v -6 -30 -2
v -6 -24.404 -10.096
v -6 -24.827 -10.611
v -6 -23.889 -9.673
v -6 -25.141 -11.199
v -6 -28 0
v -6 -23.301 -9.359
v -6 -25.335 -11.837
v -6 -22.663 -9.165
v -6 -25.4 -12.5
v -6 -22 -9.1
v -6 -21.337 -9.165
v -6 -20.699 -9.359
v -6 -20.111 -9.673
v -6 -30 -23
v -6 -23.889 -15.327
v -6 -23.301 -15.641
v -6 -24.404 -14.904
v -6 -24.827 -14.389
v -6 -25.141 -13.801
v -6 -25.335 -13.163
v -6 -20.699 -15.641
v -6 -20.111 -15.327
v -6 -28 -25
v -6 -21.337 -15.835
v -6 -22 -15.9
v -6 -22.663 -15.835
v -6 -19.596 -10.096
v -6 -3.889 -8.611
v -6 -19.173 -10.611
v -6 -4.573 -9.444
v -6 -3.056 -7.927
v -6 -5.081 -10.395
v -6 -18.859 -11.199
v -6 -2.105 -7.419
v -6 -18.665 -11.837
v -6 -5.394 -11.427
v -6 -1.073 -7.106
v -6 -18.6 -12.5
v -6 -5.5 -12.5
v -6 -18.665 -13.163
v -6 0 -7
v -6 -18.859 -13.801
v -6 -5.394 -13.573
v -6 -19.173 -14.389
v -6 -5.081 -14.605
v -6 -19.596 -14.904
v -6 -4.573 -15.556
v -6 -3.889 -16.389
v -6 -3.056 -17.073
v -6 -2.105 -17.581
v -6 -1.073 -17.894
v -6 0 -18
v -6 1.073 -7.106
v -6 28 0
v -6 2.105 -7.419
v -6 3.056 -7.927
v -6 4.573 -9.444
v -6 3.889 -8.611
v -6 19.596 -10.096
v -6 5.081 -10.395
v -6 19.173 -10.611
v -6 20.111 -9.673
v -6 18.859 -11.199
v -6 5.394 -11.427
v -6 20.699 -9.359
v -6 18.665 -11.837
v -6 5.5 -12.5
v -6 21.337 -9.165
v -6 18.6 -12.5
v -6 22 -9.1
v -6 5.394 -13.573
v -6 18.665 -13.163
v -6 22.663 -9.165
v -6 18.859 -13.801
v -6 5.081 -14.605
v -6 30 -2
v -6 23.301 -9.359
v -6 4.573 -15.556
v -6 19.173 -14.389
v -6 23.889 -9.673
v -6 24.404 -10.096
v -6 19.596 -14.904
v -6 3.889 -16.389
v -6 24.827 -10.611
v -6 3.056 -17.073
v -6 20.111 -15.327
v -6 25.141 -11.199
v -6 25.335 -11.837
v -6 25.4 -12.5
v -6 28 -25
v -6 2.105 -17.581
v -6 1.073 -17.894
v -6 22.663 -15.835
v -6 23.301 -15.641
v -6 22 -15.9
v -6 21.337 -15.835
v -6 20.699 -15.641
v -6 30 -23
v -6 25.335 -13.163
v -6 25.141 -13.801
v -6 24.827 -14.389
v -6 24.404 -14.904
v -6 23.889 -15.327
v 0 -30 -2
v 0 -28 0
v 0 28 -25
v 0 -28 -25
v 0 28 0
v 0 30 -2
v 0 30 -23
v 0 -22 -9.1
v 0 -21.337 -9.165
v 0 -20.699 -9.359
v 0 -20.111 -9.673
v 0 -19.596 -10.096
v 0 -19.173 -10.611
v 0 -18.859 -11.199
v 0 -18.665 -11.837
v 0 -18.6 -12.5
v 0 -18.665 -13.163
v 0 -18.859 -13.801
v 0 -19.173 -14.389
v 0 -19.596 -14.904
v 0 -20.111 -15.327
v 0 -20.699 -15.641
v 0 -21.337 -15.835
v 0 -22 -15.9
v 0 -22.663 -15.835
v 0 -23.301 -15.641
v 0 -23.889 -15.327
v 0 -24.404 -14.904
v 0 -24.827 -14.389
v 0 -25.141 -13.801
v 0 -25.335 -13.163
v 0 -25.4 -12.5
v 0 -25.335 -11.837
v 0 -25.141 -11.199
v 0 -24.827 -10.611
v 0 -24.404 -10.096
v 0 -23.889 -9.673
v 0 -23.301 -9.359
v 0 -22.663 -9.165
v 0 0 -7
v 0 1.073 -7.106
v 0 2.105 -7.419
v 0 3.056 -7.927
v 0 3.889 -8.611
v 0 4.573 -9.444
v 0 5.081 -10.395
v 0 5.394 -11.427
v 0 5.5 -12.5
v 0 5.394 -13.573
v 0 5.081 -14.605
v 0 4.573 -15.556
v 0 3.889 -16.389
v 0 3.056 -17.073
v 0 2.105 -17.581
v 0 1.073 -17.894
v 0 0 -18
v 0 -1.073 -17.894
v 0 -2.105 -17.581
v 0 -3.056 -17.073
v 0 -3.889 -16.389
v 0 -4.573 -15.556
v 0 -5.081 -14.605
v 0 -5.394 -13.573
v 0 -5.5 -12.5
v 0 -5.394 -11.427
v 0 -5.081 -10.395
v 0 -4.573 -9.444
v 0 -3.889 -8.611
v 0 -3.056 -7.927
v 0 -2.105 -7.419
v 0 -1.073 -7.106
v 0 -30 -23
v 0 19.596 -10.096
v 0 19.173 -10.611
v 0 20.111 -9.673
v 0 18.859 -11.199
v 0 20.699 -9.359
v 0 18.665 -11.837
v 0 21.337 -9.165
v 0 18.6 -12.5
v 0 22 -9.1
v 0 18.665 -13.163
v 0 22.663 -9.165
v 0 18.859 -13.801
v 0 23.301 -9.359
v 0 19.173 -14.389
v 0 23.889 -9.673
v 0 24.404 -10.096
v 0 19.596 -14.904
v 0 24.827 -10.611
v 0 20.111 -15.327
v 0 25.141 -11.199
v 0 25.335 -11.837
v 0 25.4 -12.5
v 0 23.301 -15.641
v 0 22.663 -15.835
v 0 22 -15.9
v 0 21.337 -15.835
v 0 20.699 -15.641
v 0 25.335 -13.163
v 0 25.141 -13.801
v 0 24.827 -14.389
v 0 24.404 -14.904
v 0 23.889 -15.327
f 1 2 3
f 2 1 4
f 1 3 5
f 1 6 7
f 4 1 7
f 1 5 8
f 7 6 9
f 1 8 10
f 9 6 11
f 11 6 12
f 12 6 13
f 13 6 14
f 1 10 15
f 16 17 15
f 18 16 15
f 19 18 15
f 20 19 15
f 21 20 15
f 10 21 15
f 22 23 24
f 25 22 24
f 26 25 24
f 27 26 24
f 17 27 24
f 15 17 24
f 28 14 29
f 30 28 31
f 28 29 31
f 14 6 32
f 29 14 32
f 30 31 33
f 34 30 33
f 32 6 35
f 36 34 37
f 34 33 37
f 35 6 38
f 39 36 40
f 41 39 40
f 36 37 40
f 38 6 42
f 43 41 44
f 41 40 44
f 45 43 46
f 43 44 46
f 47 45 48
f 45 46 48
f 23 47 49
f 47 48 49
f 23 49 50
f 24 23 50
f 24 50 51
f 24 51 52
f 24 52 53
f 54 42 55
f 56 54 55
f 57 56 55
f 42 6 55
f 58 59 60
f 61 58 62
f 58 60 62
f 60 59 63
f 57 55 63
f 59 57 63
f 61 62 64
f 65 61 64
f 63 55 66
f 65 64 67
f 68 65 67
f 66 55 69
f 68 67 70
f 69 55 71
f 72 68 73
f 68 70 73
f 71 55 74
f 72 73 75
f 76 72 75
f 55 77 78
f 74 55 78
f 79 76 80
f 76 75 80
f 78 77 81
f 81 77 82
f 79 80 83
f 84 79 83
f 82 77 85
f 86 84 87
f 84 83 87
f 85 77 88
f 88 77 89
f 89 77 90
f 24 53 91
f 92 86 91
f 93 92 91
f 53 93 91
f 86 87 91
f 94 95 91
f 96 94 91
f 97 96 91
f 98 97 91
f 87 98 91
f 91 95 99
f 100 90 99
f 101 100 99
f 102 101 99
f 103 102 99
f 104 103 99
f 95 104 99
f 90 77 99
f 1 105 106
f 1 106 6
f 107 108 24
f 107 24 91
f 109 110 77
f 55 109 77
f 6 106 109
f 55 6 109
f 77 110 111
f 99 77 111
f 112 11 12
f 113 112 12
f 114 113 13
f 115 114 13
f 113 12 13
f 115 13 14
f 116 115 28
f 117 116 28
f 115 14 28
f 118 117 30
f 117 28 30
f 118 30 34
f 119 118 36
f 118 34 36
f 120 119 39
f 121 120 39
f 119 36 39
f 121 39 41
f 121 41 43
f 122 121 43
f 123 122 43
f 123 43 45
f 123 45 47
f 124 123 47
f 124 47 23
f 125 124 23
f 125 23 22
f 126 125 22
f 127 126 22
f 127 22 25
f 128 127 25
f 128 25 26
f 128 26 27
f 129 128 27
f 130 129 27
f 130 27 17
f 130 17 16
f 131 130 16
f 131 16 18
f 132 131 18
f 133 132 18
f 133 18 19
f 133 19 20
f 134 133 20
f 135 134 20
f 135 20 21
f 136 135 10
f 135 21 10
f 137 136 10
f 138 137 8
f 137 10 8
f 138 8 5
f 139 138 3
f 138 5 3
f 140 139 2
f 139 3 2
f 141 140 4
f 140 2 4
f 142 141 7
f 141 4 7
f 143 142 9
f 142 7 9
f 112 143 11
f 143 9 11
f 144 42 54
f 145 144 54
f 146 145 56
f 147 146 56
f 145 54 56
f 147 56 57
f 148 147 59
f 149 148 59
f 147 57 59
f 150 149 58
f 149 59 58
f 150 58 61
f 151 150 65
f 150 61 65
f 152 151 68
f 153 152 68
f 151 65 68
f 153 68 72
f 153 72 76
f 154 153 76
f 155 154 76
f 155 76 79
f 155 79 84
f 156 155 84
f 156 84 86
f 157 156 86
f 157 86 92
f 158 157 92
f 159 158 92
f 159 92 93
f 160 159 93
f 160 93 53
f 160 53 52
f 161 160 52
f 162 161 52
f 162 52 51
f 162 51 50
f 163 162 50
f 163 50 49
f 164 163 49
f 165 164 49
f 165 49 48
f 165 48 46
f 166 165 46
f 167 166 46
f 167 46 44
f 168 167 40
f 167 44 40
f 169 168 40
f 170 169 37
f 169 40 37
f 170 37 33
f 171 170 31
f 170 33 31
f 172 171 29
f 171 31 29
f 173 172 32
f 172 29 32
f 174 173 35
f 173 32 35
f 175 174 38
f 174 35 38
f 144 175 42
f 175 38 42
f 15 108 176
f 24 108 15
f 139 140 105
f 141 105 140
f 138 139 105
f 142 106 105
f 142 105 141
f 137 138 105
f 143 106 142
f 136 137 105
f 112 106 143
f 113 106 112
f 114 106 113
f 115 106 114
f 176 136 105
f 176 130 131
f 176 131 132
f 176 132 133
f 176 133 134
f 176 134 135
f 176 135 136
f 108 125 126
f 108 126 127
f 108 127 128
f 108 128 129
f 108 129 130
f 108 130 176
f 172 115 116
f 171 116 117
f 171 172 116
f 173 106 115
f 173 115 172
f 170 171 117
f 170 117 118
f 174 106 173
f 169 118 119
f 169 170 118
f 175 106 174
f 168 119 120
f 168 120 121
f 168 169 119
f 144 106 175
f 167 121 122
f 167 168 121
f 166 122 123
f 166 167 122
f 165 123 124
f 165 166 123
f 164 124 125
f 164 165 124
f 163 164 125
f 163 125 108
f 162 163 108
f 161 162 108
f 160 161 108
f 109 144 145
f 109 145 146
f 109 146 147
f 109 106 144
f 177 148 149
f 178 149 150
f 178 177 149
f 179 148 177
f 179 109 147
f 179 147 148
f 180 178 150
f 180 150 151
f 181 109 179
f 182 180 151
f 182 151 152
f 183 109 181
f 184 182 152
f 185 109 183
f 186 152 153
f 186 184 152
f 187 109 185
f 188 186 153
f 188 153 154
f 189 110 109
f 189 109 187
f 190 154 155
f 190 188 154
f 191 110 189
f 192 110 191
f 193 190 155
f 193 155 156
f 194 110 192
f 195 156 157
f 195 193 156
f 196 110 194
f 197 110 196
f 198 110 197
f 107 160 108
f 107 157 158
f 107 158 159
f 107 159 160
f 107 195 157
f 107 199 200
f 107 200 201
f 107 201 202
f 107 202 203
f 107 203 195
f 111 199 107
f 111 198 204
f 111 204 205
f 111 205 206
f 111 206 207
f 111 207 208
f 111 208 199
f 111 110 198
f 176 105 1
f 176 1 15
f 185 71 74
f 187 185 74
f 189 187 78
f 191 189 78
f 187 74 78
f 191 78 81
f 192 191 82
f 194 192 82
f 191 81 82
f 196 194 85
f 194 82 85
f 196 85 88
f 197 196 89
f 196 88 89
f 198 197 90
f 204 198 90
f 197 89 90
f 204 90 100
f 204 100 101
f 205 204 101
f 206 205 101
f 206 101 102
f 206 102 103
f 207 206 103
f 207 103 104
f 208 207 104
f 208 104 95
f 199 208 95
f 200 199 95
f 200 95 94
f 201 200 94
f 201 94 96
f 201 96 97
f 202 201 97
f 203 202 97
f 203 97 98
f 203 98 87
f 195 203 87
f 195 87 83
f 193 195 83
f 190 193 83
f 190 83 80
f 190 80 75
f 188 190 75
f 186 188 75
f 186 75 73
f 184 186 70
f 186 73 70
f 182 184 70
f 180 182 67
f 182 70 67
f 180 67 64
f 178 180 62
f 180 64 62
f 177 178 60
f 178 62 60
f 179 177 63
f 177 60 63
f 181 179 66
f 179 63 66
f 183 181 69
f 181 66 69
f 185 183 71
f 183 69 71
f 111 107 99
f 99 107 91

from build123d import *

# Parameters (mm, degrees)
SKETCH1_W                  = 25
SKETCH1_H                  = 60
BOSS_EXTRUDE1_DEPTH        = 6
F_11_0_11_DIAMETER_HOLE1_D = 11
M8X1_25_TAPPED_HOLE1_D     = 6.8
CHAMFER1_SIZE              = 2


with BuildPart() as part:
    # Sketch1 → Boss-Extrude1 (new body)
    with BuildSketch(Plane(origin=(0, 0, 0), x_dir=(0, 0, -1), z_dir=(1, 0, 0))):
        with Locations((12.5, 0)):
            Rectangle(SKETCH1_W, SKETCH1_H)
    extrude(amount=-BOSS_EXTRUDE1_DEPTH)

    # Ø11.0 (11) Diameter Hole1 (through all)
    with Locations(Plane(origin=(0, 0, 0), x_dir=(0, 0, -1), z_dir=(1, 0, 0))):
        with Locations((12.5, 0)):
            Hole(F_11_0_11_DIAMETER_HOLE1_D / 2)

    # M8x1.25 Tapped Hole1 (through all)
    with Locations(Plane(origin=(0, 0, 0), x_dir=(0, 0, -1), z_dir=(1, 0, 0))):
        with Locations((12.5, 22), (12.5, -22)):
            Hole(M8X1_25_TAPPED_HOLE1_D / 2)

    # Chamfer1
    chamfer1_edges = [part.edges().sort_by_distance(p)[0] for p in [
        (-3, 30, 0),
        (-3, 30, -25),
        (-3, -30, -25),
        (-3, -30, 0),
    ]]
    chamfer(chamfer1_edges, length=CHAMFER1_SIZE)


solid = part.part
